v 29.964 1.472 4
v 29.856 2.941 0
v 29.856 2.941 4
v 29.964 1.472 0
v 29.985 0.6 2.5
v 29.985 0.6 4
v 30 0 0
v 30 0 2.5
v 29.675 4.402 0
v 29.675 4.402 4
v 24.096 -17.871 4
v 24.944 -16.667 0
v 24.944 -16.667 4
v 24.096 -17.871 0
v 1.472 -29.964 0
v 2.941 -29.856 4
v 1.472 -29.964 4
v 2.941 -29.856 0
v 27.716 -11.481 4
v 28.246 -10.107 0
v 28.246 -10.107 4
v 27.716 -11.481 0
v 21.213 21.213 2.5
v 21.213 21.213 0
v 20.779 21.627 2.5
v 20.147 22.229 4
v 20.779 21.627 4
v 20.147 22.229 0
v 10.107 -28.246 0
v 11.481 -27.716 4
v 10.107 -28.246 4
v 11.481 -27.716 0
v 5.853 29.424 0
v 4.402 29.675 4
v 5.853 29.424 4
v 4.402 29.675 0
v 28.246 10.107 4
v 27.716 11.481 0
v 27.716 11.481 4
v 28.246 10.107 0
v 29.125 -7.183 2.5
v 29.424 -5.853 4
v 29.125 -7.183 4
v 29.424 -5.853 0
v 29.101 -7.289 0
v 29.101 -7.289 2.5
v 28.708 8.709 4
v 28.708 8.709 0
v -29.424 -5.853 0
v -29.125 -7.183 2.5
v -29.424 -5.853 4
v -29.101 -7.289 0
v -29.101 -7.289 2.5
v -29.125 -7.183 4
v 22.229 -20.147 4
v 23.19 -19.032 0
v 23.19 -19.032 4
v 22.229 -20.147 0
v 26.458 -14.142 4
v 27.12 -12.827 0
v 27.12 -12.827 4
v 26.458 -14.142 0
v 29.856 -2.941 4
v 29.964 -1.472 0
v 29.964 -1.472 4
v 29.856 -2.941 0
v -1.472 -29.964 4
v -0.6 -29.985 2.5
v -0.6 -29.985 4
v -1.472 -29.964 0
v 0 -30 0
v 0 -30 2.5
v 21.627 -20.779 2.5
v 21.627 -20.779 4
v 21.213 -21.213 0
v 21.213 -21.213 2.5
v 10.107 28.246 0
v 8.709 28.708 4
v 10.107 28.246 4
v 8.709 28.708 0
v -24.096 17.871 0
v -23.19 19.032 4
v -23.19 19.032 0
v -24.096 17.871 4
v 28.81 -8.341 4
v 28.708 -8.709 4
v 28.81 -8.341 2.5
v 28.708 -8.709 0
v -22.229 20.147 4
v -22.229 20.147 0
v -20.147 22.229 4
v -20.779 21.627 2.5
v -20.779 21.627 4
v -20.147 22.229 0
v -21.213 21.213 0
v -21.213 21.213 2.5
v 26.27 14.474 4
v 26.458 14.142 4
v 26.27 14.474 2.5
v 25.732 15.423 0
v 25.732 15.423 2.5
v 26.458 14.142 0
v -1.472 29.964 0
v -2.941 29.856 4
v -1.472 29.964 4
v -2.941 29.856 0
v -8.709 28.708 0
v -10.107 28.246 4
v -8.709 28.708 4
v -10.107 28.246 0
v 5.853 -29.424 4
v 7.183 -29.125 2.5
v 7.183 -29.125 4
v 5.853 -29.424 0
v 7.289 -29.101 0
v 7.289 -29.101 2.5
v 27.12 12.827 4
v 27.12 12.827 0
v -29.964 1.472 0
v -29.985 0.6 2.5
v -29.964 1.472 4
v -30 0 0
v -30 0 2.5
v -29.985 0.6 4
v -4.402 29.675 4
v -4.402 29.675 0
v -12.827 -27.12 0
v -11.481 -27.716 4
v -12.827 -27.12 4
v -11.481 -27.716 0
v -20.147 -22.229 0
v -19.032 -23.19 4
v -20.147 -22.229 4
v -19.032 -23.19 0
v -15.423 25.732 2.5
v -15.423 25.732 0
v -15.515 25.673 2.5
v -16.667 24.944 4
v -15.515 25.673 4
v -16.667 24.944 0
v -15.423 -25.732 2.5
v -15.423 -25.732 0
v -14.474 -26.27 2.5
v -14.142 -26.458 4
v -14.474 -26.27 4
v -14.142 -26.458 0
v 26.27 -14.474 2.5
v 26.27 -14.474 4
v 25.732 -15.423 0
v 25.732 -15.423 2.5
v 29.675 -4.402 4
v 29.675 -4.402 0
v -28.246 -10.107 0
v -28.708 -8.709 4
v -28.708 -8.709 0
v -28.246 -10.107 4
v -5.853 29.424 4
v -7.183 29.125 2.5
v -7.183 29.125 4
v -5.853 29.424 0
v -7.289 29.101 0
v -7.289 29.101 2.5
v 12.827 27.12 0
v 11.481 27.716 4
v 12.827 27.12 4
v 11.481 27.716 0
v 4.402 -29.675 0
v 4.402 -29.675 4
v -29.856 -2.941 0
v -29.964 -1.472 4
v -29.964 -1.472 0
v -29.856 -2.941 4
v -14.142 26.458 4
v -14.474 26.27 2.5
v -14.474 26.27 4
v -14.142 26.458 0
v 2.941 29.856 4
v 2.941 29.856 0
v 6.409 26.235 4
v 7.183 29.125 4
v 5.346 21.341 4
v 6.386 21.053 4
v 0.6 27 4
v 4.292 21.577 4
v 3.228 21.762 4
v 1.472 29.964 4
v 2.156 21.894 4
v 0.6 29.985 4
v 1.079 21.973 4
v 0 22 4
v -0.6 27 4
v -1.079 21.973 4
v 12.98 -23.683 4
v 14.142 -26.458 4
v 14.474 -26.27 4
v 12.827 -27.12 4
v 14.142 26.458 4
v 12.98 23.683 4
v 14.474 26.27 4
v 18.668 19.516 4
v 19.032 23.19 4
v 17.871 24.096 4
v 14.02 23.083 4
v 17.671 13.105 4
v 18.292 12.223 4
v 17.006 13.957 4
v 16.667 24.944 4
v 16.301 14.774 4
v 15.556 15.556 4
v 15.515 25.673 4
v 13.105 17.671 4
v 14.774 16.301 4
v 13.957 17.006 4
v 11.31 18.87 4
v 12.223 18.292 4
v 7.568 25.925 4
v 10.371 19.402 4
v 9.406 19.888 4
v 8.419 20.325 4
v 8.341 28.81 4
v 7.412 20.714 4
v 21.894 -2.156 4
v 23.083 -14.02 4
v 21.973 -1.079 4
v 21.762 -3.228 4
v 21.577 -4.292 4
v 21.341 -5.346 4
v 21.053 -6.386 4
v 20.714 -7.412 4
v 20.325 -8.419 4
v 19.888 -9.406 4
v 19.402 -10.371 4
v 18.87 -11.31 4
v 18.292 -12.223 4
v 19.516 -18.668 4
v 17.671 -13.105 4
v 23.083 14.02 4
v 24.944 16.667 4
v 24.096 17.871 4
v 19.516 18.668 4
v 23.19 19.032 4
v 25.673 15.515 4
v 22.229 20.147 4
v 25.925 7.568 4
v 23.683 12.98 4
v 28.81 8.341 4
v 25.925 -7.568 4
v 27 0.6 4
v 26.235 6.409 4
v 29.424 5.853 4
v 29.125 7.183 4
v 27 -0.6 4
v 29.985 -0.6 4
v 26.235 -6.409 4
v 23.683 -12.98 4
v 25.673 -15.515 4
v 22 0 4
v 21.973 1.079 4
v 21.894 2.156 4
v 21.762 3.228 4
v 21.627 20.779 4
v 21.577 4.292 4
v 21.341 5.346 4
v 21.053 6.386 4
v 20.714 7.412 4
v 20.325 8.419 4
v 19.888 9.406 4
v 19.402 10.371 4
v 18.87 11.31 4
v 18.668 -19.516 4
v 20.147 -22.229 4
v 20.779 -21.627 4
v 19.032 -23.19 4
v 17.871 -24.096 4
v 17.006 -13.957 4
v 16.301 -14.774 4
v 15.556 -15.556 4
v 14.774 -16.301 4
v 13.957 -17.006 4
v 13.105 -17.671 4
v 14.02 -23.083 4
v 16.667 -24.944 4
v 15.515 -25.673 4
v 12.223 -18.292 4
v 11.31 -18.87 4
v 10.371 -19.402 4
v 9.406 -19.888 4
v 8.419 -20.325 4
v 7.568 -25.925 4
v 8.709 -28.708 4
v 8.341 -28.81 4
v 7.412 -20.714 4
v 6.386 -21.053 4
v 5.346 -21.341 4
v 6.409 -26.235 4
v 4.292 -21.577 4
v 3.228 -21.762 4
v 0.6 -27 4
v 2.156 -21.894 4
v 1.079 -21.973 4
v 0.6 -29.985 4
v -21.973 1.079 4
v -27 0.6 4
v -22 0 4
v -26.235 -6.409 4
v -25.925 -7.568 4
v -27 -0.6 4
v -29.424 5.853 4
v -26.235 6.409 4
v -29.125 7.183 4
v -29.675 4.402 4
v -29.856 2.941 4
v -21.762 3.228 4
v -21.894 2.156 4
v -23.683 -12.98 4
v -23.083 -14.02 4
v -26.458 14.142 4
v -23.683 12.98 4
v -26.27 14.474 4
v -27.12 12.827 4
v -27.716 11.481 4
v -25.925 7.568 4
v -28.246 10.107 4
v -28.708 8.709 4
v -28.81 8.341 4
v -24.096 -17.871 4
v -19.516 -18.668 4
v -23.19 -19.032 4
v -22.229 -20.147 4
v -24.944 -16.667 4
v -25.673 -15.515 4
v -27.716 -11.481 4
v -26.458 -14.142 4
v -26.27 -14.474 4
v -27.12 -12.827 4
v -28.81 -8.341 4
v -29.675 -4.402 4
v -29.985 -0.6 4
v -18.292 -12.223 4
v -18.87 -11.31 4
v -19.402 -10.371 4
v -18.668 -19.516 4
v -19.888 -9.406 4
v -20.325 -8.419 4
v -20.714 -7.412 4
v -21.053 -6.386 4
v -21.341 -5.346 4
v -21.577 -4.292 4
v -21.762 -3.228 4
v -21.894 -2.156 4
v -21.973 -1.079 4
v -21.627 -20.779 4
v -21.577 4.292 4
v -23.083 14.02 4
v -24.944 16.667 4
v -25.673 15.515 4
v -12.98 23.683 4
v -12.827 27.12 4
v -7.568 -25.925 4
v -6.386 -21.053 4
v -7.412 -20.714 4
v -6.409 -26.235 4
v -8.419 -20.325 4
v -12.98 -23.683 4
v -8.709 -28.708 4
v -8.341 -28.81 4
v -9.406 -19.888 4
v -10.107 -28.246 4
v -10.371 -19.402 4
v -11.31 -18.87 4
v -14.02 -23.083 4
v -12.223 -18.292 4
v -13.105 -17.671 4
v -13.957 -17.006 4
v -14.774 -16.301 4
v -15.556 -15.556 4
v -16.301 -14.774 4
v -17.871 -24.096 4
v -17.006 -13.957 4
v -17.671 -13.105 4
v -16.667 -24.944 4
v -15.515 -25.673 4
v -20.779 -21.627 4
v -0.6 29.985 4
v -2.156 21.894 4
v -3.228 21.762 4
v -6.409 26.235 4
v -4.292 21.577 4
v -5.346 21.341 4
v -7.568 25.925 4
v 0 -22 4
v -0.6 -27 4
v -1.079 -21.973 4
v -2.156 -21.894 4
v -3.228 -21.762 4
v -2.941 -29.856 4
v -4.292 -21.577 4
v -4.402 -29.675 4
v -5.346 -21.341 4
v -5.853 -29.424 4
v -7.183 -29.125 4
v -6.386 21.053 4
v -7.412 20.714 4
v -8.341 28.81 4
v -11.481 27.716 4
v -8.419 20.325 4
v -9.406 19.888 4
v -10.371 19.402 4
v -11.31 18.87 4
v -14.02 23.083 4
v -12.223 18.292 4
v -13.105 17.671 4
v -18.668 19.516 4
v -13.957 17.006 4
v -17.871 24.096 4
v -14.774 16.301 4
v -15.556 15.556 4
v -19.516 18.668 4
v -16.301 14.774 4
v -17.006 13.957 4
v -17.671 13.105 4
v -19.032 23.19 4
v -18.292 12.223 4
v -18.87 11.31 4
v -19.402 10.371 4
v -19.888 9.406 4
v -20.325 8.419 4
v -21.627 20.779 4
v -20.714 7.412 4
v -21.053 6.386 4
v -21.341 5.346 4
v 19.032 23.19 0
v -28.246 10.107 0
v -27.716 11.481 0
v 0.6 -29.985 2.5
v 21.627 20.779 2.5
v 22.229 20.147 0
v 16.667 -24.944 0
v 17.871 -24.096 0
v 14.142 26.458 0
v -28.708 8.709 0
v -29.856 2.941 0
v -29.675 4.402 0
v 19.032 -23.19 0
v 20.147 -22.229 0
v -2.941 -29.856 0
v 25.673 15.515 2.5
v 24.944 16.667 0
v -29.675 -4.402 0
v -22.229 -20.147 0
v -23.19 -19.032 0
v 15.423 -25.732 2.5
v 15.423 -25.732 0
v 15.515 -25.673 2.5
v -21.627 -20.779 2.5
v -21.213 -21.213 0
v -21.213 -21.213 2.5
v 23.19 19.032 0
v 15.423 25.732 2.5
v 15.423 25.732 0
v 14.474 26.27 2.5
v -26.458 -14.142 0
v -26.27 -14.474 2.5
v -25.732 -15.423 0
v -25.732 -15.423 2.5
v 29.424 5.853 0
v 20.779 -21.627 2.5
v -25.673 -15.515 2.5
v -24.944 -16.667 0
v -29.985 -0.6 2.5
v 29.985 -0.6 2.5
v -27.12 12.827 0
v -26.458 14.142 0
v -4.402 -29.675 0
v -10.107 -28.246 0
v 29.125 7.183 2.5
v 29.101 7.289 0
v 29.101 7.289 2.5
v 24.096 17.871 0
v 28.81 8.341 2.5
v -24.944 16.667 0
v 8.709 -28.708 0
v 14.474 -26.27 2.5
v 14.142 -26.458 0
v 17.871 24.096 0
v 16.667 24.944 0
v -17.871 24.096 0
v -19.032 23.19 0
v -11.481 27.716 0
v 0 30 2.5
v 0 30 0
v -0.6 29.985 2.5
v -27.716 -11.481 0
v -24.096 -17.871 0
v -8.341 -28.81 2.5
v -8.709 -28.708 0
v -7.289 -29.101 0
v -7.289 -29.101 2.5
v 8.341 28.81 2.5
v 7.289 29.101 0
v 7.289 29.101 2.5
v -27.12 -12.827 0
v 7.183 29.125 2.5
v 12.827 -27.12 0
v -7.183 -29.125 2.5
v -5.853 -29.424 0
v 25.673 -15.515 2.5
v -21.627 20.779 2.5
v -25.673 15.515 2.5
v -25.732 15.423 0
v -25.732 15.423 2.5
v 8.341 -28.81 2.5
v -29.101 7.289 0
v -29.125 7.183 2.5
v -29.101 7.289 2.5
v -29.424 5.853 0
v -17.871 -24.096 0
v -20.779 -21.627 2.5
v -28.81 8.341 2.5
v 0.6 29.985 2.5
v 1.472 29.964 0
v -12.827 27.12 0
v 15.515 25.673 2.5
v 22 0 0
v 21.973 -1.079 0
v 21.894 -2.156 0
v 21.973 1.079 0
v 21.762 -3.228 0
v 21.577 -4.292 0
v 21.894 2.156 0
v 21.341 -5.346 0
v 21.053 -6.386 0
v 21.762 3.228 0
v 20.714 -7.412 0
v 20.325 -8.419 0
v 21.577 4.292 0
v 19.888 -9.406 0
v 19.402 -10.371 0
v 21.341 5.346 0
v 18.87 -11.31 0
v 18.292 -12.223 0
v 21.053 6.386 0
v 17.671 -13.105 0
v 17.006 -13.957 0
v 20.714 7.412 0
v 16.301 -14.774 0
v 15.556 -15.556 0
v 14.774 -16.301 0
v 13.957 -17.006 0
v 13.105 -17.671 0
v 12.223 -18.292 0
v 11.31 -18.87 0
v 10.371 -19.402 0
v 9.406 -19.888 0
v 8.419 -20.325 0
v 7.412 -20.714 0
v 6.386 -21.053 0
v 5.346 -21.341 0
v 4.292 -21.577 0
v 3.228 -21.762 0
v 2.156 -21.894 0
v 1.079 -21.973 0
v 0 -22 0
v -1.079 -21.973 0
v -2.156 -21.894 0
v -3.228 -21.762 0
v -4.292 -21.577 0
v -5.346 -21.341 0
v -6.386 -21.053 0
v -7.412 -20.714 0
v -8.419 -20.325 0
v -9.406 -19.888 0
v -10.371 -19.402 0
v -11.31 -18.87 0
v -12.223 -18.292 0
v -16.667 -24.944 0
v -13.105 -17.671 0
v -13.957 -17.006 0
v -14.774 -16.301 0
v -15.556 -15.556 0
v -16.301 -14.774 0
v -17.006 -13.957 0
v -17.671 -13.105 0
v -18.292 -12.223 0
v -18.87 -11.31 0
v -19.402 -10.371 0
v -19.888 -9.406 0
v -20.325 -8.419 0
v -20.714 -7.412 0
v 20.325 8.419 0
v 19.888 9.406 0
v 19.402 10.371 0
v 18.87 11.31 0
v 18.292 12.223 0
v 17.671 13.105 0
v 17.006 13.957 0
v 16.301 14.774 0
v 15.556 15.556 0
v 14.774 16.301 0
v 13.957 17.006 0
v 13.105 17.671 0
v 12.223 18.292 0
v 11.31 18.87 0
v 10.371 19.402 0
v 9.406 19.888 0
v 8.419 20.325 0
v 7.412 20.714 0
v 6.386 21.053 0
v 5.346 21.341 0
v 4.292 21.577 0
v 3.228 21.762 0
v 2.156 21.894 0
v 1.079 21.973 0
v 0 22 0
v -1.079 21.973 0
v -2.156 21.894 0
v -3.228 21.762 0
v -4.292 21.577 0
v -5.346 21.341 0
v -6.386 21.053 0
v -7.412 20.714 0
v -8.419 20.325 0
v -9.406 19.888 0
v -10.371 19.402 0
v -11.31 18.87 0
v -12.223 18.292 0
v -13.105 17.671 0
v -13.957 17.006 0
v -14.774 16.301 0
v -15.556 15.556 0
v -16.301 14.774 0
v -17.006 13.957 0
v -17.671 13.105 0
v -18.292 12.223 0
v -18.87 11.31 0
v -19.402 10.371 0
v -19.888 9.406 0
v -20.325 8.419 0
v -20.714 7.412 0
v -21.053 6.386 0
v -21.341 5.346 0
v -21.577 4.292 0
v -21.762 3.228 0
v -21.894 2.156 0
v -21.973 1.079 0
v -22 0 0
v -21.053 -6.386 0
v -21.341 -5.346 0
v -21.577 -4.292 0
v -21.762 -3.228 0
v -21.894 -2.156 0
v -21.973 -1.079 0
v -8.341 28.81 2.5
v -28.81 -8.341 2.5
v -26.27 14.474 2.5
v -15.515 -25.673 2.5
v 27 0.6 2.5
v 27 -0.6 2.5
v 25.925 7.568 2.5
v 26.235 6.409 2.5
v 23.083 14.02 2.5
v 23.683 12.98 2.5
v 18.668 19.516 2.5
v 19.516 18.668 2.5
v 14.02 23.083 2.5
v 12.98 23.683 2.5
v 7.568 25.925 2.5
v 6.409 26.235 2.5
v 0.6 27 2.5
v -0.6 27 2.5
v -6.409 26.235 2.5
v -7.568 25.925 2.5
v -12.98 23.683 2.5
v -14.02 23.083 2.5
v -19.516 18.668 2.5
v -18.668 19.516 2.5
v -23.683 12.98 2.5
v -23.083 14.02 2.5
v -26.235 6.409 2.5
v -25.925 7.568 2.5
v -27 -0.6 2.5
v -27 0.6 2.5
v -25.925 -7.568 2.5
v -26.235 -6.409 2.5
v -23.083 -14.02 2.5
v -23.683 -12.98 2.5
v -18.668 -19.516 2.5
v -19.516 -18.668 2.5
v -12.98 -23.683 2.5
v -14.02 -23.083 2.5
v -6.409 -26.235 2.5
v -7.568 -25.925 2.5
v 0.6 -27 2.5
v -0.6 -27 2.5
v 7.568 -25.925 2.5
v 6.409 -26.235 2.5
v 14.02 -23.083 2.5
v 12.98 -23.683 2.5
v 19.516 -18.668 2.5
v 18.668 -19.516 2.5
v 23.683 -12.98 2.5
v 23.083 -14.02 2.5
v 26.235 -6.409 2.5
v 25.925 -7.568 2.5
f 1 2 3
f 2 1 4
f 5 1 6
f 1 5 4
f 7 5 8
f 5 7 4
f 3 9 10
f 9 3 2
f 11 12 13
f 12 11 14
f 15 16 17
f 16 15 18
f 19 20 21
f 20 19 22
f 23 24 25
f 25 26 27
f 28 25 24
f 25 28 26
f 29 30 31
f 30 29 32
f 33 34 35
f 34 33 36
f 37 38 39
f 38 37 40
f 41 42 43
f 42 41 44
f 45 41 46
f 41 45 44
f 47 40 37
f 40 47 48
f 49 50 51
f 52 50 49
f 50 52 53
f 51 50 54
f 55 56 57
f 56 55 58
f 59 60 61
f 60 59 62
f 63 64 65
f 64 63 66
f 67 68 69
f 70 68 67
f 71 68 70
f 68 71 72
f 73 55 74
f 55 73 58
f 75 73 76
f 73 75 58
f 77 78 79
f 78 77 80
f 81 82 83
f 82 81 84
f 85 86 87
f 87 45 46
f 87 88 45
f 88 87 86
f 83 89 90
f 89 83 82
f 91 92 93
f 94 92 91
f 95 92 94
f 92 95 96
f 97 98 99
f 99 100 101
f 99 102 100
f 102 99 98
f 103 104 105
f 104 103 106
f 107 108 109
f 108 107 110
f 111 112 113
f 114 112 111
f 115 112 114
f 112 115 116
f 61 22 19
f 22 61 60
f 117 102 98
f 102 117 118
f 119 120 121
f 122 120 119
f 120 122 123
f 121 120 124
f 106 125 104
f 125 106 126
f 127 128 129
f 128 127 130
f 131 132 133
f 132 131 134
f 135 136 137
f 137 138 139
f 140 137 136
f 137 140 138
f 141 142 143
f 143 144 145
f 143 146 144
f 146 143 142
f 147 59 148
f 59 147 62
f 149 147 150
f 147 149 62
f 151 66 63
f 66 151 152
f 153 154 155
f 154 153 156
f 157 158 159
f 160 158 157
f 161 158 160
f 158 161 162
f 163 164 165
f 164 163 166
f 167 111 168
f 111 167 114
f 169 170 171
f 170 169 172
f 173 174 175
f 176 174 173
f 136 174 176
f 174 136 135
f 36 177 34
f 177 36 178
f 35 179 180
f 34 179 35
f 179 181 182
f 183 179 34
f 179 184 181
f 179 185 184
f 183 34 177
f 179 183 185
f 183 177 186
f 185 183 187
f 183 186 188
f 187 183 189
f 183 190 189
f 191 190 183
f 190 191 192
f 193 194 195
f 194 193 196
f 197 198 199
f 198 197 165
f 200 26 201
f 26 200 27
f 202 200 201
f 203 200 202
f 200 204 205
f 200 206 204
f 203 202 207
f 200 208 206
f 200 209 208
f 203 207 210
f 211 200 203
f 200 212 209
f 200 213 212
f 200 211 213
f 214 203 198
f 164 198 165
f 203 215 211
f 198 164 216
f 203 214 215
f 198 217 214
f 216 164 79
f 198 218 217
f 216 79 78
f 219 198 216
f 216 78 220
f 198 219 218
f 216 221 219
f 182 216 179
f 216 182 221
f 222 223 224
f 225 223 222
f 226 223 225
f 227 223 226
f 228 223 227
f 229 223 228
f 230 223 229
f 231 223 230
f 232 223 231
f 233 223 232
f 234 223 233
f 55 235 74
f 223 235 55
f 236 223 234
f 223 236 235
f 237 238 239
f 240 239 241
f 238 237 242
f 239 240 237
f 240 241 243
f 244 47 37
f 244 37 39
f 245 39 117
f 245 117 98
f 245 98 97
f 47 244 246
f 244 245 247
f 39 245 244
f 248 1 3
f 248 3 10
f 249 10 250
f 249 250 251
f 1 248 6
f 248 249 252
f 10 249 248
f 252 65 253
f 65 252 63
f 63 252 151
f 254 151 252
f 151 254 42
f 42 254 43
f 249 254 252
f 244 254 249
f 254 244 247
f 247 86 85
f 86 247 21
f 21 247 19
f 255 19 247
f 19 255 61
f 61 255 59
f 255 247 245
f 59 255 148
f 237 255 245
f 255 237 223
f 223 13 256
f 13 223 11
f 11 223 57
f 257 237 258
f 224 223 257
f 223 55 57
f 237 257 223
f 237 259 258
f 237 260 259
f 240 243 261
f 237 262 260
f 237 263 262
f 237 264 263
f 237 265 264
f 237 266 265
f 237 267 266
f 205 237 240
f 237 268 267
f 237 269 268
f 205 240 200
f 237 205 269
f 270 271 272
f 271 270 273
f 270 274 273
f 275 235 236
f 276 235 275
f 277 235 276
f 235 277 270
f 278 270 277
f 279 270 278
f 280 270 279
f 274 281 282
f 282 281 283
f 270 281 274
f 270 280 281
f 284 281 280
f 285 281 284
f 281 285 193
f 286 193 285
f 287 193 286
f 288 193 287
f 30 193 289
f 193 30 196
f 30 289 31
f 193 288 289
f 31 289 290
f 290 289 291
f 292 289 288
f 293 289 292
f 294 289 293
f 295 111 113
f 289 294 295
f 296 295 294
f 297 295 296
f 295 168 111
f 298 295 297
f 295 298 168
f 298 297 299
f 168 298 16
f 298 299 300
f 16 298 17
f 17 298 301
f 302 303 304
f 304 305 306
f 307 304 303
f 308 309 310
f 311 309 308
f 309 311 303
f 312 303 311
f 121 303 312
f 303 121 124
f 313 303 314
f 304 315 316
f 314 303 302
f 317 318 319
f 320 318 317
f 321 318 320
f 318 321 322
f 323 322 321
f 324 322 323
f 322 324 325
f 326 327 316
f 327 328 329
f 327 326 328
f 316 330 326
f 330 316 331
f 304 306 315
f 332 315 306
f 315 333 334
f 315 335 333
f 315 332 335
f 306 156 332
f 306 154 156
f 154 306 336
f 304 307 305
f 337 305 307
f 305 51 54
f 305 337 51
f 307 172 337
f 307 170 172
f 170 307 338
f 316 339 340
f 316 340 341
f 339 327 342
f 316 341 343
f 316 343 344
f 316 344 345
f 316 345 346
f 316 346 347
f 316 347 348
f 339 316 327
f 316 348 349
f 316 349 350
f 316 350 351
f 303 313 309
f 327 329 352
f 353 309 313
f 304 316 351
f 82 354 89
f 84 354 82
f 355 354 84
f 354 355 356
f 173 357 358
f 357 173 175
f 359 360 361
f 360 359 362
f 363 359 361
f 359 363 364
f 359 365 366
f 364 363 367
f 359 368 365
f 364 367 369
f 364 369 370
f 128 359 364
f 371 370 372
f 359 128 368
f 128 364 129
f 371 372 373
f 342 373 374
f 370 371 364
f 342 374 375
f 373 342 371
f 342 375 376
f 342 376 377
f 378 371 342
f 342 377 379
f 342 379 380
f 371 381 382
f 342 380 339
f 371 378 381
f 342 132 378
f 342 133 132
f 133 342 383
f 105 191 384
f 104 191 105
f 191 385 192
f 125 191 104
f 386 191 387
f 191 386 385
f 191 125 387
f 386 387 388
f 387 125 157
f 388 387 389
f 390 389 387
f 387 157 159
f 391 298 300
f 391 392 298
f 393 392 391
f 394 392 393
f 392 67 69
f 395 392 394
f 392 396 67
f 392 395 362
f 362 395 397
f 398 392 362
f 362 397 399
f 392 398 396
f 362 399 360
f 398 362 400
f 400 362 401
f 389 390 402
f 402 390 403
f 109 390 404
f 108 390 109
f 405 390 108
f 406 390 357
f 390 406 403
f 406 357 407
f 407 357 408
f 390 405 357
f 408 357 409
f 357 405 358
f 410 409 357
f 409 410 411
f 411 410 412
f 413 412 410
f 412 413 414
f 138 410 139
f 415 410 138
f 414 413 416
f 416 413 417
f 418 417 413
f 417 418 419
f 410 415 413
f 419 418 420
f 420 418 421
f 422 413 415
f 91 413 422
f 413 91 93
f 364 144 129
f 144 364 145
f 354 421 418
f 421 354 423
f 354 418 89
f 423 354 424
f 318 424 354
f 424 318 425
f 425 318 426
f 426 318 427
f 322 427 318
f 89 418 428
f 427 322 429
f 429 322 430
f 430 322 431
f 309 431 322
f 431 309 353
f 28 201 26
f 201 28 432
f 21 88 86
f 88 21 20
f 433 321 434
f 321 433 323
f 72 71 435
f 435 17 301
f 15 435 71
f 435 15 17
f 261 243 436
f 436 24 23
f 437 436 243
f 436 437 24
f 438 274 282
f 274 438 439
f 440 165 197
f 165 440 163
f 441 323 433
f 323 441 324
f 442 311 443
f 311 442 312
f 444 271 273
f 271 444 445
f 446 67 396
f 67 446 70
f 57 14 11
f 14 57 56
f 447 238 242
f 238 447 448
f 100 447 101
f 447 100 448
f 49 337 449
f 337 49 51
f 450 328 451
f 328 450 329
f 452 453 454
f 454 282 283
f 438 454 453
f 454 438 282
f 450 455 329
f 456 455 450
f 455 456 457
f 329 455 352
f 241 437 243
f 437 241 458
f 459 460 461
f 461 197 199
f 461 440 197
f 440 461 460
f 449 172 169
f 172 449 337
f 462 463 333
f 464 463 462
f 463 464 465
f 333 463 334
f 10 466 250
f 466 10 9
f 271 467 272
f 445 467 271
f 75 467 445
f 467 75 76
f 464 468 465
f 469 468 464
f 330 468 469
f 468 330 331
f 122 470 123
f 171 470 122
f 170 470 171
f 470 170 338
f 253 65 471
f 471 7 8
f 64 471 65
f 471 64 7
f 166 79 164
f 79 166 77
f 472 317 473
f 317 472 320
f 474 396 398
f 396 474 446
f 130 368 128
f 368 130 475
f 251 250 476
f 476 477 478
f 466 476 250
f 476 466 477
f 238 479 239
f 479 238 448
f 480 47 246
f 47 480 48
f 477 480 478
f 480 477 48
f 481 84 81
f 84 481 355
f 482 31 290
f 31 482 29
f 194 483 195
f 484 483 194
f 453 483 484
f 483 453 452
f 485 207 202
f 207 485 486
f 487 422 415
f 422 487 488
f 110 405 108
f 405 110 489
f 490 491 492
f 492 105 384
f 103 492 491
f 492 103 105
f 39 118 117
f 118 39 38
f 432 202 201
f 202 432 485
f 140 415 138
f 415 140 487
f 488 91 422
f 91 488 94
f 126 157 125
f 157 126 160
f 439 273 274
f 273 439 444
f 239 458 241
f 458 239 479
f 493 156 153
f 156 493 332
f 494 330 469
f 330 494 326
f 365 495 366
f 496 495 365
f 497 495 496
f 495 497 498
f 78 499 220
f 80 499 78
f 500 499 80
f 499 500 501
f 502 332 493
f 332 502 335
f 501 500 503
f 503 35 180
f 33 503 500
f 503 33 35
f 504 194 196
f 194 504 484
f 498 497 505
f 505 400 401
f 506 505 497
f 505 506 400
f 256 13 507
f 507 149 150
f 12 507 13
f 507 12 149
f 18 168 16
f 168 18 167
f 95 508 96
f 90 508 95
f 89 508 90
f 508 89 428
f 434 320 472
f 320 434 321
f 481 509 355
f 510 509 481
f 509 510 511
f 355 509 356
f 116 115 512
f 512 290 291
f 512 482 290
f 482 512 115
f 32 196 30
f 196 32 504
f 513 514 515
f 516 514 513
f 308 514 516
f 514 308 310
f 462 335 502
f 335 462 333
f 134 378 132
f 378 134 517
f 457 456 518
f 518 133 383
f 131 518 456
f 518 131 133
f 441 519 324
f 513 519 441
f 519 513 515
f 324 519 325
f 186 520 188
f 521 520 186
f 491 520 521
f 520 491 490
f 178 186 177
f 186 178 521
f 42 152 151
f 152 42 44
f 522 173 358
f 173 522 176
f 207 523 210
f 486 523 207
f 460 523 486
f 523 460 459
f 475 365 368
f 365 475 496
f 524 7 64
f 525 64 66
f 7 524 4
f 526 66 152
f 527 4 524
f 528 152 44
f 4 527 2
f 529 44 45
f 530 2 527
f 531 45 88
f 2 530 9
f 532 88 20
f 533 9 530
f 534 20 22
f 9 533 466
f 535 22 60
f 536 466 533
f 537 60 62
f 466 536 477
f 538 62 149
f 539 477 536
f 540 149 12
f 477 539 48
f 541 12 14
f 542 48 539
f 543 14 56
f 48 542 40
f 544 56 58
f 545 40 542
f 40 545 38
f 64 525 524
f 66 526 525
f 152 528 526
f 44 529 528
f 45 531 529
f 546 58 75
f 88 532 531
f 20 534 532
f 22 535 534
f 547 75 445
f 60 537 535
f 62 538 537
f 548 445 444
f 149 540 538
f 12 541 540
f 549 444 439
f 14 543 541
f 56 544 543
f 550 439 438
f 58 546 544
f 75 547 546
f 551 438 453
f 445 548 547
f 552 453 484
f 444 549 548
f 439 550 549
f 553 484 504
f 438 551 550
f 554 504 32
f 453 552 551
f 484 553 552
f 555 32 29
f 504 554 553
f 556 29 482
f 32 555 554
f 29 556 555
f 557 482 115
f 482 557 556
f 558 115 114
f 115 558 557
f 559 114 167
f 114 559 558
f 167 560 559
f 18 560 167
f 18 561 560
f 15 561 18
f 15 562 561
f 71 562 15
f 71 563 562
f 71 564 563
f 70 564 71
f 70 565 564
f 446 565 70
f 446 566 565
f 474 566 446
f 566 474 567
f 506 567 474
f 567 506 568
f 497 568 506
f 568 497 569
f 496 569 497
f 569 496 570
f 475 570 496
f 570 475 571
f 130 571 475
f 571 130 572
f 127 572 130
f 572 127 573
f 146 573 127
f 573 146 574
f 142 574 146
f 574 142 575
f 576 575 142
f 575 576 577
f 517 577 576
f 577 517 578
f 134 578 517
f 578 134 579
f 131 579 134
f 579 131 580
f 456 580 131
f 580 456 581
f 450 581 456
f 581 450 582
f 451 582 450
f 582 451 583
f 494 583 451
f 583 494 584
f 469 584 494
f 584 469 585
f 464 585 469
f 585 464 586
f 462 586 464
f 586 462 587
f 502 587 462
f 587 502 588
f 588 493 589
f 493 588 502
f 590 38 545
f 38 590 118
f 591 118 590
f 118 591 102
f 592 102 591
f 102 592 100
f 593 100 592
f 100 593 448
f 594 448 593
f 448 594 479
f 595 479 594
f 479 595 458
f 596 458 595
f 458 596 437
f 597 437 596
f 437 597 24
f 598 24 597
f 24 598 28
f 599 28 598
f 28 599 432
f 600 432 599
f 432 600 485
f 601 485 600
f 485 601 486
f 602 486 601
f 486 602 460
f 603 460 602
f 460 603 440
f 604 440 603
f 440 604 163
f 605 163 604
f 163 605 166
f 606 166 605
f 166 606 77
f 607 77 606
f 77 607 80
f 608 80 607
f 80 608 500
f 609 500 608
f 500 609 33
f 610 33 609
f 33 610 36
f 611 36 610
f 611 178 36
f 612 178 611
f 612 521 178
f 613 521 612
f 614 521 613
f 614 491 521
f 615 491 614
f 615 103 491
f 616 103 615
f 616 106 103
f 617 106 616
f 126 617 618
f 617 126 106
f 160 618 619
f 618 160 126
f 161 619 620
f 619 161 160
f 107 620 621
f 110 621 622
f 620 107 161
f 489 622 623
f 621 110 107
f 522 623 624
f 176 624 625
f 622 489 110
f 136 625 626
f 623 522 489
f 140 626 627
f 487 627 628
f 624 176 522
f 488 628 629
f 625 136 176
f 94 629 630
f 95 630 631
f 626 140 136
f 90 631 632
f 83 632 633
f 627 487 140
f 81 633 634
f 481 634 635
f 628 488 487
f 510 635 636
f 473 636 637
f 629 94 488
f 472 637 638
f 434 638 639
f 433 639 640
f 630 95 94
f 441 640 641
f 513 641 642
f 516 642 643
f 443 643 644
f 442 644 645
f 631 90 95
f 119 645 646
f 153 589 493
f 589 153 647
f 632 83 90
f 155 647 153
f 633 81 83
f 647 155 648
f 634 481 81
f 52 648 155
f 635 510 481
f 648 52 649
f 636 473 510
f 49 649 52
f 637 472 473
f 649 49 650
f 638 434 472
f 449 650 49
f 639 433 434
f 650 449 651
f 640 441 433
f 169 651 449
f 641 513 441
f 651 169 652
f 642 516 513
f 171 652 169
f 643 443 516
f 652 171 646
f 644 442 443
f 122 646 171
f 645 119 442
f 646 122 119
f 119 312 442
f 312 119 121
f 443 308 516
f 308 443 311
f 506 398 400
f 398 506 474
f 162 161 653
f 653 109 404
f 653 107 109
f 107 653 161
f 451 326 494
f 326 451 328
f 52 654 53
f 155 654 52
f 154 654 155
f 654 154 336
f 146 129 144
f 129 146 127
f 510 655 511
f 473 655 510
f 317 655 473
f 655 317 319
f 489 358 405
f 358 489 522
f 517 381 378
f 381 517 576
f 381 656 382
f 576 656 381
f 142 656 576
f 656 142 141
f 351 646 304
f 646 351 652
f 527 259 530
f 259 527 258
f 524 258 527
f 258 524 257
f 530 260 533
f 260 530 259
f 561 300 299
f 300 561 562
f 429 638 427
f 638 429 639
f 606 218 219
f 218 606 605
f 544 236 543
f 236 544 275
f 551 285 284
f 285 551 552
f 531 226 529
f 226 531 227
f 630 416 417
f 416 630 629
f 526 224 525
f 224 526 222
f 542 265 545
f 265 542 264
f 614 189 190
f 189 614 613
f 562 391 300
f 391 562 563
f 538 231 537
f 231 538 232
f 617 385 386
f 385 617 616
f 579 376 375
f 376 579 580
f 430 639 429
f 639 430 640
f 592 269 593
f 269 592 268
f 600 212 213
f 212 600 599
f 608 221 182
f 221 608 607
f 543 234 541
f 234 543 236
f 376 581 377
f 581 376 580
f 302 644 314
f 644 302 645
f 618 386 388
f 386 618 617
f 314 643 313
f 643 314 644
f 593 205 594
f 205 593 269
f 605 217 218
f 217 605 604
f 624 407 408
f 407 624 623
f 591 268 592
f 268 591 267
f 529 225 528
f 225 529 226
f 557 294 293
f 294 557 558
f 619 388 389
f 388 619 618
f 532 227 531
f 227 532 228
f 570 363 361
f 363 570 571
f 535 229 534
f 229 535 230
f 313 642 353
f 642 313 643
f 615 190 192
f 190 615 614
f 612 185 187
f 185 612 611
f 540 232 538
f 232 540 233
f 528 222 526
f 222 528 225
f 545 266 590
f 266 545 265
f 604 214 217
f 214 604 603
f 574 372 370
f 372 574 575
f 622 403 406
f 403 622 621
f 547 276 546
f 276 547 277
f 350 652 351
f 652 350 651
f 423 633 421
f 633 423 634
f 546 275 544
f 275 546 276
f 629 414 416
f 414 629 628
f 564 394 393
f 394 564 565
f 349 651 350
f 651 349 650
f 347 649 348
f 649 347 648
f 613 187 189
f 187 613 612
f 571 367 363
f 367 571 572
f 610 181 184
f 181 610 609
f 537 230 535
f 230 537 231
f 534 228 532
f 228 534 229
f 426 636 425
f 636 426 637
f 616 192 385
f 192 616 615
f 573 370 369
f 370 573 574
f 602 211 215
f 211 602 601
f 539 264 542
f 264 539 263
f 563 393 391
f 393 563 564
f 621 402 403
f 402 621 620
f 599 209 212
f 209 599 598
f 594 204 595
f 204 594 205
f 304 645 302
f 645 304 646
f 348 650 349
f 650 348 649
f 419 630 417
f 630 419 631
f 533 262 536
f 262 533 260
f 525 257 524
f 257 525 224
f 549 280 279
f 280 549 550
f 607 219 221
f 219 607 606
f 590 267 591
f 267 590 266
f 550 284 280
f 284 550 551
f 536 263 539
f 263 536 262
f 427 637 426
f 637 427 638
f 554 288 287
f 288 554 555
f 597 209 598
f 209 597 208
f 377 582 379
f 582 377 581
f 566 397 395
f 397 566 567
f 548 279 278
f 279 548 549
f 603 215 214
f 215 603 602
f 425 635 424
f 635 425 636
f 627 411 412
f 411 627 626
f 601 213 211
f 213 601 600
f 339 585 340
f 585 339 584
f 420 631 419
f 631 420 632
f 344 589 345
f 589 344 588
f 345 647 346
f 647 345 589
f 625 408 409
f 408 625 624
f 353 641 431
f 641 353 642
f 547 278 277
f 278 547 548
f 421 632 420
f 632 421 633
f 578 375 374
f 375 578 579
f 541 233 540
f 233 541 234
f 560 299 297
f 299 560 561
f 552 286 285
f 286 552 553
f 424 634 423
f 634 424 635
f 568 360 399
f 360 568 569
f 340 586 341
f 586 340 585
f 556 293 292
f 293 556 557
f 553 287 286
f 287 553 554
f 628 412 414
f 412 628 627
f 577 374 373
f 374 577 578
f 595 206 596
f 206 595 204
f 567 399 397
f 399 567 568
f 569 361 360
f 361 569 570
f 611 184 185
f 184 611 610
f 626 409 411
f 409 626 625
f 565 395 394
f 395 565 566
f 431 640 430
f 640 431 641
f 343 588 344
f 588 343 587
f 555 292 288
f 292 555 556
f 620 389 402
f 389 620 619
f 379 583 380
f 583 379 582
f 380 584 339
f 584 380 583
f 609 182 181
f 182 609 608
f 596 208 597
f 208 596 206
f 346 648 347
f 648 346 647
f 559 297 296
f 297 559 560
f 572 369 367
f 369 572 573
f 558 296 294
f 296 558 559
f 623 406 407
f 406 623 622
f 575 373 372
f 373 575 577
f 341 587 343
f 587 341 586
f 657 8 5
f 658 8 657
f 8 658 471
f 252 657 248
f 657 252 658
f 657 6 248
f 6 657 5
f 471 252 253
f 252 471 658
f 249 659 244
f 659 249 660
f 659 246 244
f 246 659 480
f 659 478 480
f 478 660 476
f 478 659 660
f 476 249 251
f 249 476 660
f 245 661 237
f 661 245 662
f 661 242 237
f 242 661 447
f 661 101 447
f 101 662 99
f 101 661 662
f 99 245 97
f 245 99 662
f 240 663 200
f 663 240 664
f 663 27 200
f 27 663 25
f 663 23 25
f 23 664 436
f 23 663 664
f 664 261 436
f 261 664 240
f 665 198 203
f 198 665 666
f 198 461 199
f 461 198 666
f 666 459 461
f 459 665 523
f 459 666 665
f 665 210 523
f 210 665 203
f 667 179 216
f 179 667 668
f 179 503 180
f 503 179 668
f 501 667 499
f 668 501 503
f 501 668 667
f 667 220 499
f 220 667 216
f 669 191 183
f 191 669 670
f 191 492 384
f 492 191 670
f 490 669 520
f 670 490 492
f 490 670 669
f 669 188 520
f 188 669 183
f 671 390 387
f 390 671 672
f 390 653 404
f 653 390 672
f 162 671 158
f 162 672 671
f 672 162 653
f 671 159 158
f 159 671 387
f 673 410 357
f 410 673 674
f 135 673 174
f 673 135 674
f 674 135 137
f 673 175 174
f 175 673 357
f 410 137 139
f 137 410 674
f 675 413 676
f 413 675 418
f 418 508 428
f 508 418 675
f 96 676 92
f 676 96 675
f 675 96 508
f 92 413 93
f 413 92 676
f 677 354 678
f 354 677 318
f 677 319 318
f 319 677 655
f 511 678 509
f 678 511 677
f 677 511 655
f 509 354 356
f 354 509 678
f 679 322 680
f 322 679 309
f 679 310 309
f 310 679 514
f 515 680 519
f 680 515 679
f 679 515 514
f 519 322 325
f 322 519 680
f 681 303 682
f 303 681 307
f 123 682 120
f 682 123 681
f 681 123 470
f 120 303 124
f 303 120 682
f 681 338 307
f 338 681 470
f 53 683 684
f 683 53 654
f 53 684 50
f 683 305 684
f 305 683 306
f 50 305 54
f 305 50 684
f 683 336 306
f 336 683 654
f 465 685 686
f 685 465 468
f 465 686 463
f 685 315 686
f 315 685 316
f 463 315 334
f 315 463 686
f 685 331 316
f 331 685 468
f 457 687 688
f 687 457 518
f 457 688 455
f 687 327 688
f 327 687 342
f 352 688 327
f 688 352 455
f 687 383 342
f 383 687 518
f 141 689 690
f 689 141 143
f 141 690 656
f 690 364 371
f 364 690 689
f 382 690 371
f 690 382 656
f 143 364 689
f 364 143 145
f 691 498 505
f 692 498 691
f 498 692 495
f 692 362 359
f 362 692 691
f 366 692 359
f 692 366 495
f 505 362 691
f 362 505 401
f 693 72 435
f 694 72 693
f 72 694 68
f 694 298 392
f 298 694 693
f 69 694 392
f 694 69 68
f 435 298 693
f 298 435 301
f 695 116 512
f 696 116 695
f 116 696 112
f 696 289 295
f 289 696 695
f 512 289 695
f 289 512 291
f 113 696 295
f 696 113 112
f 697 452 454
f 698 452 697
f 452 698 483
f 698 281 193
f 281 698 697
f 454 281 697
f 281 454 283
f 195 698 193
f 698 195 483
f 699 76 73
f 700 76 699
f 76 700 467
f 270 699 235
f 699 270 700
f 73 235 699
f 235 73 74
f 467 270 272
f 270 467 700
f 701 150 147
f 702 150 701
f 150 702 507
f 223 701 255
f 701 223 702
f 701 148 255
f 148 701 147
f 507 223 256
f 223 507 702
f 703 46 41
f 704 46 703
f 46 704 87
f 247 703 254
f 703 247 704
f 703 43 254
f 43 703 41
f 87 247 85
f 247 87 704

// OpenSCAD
// Flat dial ring with radial tick marks for a rotary stage
// Units: mm. Print orientation: flat on bed, top face up.

$fn = 128;

// --- Ring dimensions ---
outer_d   = 60;    // outer diameter of annulus
inner_d   = 44;    // inner diameter of annulus
thickness = 4;     // ring thickness (Z)

// --- Tick mark dimensions ---
tick_count  = 24;   // number of evenly spaced ticks
tick_width  = 1.2;  // groove width
tick_depth  = 1.5;  // groove depth from top face
tick_length = 3;    // radial length inward from outer edge

// --- Helpers ---
eps = 0.5;          // overshoot for clean boolean cuts
outer_r = outer_d / 2;
inner_r = inner_d / 2;

difference() {
    // Annulus body
    difference() {
        cylinder(h = thickness, r = outer_r);
        translate([0, 0, -eps])
            cylinder(h = thickness + 2 * eps, r = inner_r);
    }

    // Radial tick grooves, first on +X axis
    for (i = [0 : tick_count - 1]) {
        rotate([0, 0, i * 360 / tick_count])
            translate([outer_r - tick_length,
                       -tick_width / 2,
                       thickness - tick_depth])
                cube([tick_length + eps,          // overshoot past outer edge
                      tick_width,
                      tick_depth + eps]);          // overshoot above top face
    }
}
